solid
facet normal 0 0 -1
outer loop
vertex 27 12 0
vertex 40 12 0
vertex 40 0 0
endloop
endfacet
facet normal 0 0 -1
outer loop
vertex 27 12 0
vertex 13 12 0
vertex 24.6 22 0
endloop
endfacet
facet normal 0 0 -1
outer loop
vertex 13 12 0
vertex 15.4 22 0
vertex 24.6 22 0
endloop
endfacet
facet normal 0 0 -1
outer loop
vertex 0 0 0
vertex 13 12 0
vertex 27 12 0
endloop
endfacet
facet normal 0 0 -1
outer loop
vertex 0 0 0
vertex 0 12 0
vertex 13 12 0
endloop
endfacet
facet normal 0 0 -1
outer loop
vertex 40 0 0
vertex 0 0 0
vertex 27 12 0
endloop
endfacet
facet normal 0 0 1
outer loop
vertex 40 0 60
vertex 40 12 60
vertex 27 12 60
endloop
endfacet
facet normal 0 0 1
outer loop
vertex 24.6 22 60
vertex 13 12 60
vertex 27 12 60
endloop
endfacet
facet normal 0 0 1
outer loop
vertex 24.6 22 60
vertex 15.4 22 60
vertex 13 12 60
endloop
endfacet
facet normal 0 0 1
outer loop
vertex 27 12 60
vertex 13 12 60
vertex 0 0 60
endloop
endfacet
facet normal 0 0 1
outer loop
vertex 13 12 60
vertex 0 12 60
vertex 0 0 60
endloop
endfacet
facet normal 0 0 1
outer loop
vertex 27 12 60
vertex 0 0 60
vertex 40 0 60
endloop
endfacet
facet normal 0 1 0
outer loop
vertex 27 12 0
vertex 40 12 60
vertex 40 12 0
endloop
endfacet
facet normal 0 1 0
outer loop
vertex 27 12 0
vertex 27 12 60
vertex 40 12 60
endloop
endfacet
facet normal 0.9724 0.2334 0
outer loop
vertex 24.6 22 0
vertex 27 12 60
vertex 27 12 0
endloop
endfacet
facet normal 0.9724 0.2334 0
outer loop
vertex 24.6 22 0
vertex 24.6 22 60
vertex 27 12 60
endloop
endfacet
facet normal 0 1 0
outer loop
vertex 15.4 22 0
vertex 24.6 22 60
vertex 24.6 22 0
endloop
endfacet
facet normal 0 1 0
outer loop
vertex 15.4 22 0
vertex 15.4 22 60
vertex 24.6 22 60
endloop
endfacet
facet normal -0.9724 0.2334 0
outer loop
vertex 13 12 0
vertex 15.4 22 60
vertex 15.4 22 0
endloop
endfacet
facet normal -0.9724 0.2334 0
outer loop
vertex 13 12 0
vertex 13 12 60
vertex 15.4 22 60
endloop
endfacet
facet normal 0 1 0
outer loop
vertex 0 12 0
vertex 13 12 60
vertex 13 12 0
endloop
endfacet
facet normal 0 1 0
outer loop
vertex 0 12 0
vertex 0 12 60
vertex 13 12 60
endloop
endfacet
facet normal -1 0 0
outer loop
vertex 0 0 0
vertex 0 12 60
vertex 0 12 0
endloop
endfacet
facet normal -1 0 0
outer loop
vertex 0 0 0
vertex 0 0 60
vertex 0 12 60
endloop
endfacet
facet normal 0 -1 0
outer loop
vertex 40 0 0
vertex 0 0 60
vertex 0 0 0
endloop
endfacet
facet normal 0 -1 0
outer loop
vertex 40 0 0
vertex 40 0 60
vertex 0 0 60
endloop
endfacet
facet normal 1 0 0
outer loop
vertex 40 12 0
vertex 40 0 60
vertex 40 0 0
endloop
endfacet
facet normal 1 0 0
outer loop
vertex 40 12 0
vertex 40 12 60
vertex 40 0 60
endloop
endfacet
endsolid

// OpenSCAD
$fn = 32;

// ----------------------------------------------------------------------
// V guide rail: dovetail, 40 mm wide
// ----------------------------------------------------------------------

// --- parameters (mm) ---
rail_w = 40;              // rail width, X
base_t = 12;              // base plate thickness
v_depth = 10;             // V feature depth / height
v_half_w = 7;             // half width of the V at the base face
plate_t = 60;             // rail length, Z (the extrusion height)
top_half_w = 4.6;         // half width at the dovetail top

dovetail_base = 2 * v_half_w;  // dovetail width at the base
dovetail_top = 2 * top_half_w;  // dovetail width at the top

profile = [[0, 0], [40, 0], [40, 12], [27, 12], [24.6, 22], [15.4, 22], [13, 12], [0, 12]];  // primary outline, 8 points, counter clockwise

// --- the one profile operation ---
linear_extrude(height = plate_t) polygon(points = profile);
